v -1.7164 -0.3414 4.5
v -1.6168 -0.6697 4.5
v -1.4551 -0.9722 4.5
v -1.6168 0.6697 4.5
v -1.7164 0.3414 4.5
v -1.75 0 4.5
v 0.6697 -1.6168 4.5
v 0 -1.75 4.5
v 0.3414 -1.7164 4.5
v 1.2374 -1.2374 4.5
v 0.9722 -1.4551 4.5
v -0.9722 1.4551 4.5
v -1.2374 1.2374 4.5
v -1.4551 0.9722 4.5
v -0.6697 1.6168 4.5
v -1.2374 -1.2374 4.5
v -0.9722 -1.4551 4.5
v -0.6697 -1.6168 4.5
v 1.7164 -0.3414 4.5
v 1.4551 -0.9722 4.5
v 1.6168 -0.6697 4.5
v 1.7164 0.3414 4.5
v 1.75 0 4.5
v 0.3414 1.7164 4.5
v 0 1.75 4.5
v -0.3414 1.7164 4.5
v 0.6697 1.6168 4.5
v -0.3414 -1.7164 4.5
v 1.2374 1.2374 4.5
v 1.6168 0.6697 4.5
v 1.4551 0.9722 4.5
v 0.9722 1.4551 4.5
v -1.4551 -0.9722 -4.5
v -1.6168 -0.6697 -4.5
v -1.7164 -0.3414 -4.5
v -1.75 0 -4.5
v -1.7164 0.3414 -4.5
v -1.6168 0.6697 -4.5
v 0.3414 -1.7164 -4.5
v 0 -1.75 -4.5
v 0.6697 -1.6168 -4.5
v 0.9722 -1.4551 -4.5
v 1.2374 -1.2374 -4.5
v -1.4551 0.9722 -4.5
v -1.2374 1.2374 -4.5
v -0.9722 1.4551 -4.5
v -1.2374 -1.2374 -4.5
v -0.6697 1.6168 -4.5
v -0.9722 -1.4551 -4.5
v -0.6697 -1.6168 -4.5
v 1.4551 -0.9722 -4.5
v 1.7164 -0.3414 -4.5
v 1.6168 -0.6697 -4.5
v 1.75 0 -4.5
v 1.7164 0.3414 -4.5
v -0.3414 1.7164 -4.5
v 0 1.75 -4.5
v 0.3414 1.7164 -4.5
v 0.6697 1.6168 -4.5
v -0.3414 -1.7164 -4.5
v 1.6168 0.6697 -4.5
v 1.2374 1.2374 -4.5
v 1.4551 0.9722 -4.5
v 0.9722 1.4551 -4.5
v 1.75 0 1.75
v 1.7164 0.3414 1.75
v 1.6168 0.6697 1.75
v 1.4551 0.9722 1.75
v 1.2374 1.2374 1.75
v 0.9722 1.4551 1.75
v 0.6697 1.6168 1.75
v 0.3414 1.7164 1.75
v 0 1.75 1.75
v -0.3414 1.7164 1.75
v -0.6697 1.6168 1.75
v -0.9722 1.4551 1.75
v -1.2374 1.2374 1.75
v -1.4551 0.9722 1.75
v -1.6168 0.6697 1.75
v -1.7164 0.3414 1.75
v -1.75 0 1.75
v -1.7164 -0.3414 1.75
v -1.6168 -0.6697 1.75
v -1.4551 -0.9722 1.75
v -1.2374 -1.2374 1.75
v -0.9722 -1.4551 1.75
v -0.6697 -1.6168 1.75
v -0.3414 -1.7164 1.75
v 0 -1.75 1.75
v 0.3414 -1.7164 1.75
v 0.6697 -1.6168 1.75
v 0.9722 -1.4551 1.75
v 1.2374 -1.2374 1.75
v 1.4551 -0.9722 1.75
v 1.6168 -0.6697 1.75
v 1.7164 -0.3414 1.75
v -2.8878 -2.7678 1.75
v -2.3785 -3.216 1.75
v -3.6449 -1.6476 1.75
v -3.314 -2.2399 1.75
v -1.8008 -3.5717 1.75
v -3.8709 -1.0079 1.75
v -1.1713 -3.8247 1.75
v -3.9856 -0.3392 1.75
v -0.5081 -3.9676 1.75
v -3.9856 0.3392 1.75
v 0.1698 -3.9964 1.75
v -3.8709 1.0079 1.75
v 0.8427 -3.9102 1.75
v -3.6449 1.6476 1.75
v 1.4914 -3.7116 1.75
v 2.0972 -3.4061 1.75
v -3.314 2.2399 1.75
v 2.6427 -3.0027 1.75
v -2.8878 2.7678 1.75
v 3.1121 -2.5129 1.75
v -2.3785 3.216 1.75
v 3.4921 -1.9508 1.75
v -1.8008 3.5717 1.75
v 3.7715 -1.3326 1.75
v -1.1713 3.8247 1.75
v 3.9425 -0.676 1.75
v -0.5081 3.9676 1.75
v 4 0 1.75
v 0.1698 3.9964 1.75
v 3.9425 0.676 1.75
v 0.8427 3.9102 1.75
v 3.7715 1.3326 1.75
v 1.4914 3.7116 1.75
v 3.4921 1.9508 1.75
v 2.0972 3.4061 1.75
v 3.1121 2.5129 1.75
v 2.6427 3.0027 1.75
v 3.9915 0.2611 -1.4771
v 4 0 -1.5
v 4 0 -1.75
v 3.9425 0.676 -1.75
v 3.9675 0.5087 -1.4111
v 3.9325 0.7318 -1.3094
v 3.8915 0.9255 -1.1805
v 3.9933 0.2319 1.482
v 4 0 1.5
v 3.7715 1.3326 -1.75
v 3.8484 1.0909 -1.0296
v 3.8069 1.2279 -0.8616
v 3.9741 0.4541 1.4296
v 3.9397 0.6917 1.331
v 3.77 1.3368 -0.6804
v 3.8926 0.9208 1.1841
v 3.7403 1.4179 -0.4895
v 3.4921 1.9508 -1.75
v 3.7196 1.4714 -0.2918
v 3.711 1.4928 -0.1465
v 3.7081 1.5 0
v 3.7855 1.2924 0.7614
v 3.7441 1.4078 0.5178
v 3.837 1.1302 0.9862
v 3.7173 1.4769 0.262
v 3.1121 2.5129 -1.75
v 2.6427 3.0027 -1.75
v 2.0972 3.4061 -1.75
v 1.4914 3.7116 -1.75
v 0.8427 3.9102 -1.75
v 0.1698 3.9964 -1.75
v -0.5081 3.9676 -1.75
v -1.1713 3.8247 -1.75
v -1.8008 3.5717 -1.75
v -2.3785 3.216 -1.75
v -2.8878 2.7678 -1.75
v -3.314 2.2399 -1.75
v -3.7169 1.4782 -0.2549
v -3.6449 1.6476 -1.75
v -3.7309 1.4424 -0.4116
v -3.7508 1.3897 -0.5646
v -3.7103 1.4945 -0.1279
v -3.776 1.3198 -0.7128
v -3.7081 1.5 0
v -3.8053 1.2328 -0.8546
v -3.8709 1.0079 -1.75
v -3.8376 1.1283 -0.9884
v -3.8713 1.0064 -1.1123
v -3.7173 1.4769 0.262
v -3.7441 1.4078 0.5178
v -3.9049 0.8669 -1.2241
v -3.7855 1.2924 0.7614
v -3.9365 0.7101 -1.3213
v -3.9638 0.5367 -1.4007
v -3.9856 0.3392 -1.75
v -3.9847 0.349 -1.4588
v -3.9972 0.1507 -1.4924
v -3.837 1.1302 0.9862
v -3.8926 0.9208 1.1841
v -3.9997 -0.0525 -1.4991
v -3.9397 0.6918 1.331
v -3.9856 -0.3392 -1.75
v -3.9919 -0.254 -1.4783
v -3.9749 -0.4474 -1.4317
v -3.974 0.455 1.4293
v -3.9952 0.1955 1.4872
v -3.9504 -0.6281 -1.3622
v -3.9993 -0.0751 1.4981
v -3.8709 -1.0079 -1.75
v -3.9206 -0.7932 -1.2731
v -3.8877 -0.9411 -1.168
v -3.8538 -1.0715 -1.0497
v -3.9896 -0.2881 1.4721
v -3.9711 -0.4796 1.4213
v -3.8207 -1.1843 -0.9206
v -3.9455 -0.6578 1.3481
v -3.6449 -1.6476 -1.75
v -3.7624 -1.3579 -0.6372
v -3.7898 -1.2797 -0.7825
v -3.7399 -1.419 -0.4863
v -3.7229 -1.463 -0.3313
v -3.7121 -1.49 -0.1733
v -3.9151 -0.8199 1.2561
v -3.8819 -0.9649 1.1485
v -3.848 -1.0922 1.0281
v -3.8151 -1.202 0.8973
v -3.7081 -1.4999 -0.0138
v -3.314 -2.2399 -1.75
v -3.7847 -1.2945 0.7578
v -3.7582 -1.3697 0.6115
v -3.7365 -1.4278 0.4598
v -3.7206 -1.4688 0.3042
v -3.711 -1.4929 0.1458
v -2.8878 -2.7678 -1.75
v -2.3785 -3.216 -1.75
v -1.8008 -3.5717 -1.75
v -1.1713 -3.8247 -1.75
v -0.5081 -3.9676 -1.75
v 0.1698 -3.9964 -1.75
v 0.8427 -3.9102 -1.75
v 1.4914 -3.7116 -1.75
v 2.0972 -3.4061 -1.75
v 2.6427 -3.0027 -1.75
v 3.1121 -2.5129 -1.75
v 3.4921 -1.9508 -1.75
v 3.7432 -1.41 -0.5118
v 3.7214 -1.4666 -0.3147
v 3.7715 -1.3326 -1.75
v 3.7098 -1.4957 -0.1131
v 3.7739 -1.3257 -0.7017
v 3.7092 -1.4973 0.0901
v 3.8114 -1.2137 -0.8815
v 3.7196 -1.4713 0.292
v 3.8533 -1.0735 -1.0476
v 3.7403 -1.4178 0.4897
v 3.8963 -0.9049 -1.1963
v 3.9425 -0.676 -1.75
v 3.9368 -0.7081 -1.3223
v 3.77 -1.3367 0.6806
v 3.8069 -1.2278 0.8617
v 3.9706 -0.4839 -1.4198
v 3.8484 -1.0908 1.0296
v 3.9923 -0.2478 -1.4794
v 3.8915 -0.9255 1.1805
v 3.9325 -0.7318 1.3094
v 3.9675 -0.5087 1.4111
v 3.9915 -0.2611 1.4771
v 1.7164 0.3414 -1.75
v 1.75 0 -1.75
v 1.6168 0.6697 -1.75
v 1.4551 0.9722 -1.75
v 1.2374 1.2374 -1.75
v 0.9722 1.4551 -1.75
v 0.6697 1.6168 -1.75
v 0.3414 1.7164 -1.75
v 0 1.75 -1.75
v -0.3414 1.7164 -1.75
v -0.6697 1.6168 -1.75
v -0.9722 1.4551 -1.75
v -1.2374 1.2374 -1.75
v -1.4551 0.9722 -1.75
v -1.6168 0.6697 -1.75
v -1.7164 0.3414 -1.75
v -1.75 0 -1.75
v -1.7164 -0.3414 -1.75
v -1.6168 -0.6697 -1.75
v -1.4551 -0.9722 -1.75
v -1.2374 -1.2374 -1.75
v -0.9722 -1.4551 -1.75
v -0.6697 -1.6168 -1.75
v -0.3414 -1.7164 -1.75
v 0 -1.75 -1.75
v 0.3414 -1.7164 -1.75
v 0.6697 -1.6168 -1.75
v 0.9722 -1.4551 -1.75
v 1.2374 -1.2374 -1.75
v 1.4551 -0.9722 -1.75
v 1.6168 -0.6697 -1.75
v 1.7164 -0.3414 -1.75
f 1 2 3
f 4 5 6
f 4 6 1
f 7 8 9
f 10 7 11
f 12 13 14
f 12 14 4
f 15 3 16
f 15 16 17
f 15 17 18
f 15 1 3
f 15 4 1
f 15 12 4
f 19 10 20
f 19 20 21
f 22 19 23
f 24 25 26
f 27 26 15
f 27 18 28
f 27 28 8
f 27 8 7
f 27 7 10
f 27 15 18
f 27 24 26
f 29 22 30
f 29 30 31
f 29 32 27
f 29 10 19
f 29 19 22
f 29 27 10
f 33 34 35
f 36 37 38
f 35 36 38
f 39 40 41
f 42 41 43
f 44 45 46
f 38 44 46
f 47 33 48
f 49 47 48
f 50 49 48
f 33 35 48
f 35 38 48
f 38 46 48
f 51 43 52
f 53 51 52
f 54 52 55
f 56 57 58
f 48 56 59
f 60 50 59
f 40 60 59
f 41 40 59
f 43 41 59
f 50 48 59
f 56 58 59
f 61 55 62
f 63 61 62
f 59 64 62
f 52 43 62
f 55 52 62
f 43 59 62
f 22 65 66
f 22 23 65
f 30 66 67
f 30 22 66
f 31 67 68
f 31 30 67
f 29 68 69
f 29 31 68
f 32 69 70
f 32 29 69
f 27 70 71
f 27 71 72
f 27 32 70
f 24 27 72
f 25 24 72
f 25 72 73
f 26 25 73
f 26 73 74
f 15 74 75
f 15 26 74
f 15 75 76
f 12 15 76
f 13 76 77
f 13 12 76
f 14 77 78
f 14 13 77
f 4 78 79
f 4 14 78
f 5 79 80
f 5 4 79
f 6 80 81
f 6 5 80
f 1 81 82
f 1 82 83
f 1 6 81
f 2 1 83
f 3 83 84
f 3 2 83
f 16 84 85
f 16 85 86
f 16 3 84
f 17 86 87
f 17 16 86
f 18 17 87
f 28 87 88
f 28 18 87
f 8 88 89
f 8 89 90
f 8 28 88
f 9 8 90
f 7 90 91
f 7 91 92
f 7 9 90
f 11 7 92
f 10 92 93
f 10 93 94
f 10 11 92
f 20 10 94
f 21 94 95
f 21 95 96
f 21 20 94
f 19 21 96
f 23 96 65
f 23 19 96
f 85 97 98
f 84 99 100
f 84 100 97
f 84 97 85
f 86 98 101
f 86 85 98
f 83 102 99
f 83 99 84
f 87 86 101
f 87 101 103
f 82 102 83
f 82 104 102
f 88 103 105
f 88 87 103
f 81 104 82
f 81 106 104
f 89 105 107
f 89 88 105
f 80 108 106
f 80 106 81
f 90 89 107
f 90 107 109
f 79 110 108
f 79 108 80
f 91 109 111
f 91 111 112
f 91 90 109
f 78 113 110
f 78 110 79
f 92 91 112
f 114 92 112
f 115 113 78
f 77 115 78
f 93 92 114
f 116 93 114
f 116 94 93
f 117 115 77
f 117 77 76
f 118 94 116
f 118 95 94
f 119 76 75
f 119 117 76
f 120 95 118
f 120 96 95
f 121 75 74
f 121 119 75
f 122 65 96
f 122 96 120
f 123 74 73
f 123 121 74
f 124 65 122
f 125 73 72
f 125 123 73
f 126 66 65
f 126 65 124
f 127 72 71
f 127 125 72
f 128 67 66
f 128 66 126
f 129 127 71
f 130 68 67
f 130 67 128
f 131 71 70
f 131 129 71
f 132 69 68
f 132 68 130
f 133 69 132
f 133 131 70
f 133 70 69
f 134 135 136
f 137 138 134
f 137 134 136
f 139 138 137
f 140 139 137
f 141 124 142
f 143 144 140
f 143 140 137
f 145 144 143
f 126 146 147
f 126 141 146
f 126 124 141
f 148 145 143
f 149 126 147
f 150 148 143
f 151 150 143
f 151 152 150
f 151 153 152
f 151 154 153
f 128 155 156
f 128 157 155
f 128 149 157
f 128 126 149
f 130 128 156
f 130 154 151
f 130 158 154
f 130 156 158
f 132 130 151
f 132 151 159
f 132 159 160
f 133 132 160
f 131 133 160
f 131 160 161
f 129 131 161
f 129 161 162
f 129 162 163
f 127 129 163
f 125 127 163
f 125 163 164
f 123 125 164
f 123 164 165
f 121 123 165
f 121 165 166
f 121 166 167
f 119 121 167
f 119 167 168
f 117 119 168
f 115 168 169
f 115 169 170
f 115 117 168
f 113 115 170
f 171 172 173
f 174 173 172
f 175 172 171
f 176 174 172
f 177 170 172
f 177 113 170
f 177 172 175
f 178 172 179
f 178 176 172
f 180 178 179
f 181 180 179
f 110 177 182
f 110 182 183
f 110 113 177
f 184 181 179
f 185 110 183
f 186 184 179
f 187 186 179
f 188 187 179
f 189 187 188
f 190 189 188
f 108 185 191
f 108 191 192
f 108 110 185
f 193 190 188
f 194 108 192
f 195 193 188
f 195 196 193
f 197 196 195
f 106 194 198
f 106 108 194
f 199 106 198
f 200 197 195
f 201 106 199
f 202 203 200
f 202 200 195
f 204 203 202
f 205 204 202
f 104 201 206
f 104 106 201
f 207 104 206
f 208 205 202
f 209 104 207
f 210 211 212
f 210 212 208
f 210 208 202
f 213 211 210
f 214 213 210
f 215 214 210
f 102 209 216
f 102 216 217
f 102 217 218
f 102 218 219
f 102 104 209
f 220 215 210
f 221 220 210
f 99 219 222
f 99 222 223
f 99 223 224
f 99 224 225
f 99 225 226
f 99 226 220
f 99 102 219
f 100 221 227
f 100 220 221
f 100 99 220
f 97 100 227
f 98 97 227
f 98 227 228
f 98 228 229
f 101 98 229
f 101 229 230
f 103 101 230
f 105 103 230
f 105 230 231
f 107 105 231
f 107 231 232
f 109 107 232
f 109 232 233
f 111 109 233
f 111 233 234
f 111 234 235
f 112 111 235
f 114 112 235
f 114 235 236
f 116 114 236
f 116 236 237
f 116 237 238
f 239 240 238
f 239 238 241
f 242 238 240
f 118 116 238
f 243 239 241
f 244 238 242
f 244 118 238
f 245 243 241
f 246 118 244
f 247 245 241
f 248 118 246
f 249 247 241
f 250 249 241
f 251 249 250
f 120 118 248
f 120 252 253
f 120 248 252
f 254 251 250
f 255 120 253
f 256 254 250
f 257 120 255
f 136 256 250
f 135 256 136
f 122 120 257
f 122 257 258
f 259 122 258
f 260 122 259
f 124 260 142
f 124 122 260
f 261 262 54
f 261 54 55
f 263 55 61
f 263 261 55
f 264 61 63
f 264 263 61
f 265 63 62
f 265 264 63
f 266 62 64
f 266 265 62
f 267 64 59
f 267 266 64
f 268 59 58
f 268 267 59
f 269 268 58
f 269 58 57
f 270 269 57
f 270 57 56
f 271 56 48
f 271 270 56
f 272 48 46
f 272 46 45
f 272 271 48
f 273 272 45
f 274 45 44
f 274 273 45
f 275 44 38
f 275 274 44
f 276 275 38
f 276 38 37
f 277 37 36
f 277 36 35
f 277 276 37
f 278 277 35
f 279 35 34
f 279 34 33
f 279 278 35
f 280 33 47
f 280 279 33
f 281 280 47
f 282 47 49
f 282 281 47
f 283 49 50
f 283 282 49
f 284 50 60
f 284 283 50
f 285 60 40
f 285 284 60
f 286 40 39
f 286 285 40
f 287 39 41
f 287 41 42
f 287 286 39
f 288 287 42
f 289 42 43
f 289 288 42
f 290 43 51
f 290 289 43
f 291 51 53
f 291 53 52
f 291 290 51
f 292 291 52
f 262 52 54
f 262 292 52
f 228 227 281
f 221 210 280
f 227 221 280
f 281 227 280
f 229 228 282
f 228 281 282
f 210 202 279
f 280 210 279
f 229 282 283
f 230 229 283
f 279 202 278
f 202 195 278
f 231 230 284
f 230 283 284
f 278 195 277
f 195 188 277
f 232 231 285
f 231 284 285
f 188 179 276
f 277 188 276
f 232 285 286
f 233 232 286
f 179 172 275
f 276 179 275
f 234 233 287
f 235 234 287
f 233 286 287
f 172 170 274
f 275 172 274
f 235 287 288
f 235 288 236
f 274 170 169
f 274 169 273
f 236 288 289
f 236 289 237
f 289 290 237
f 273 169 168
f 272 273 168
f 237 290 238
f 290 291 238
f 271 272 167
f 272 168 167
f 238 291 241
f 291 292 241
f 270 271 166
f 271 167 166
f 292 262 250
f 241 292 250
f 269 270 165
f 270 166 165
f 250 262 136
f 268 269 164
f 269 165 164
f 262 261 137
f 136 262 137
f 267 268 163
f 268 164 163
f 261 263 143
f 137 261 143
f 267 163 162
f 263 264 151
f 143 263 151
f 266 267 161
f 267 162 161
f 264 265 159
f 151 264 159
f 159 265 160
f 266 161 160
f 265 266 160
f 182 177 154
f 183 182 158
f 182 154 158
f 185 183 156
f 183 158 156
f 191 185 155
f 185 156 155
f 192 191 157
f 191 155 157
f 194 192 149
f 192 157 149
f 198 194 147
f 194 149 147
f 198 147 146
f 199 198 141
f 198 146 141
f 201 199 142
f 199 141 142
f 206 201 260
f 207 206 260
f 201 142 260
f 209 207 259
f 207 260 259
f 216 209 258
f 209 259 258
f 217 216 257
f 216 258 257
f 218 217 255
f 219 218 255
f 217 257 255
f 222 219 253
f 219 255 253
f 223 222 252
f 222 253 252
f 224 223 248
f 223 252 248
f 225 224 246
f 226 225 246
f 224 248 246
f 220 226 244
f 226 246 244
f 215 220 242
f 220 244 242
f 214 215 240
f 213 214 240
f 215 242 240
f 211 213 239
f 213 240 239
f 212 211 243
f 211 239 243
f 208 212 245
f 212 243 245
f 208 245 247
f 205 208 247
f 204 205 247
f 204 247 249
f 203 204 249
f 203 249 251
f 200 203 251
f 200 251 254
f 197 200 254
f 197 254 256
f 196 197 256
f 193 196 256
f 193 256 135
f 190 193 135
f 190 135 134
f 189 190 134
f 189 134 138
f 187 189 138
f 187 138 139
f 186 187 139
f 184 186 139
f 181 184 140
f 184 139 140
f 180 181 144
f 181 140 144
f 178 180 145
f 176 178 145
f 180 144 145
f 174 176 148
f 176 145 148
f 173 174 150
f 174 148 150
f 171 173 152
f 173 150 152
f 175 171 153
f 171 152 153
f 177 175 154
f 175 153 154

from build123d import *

# Parameters (mm, degrees)
F0_R     = 4
F0_R_2   = 1.75
F1_DEPTH = 1.75
F2_DEPTH = 4.5
F3_R     = 1.5
F4_DEPTH = 5


with BuildPart() as f1:
    # F0 (on Top) → F1 (new body, symmetric)
    with BuildSketch(Plane.XY):
        Circle(F0_R)
        Circle(F0_R_2, mode=Mode.SUBTRACT)
    extrude(amount=F1_DEPTH, both=True)

    # F0 (on Top) → F2 (join, symmetric)
    with BuildSketch(Plane.XY):
        Circle(F0_R_2)
    extrude(amount=F2_DEPTH, both=True)

    # F3 (on Right) → F4 (cut, symmetric)
    with BuildSketch(Plane.YZ):
        Circle(F3_R)
    extrude(amount=F4_DEPTH, both=True, mode=Mode.SUBTRACT)


solid = f1.part
